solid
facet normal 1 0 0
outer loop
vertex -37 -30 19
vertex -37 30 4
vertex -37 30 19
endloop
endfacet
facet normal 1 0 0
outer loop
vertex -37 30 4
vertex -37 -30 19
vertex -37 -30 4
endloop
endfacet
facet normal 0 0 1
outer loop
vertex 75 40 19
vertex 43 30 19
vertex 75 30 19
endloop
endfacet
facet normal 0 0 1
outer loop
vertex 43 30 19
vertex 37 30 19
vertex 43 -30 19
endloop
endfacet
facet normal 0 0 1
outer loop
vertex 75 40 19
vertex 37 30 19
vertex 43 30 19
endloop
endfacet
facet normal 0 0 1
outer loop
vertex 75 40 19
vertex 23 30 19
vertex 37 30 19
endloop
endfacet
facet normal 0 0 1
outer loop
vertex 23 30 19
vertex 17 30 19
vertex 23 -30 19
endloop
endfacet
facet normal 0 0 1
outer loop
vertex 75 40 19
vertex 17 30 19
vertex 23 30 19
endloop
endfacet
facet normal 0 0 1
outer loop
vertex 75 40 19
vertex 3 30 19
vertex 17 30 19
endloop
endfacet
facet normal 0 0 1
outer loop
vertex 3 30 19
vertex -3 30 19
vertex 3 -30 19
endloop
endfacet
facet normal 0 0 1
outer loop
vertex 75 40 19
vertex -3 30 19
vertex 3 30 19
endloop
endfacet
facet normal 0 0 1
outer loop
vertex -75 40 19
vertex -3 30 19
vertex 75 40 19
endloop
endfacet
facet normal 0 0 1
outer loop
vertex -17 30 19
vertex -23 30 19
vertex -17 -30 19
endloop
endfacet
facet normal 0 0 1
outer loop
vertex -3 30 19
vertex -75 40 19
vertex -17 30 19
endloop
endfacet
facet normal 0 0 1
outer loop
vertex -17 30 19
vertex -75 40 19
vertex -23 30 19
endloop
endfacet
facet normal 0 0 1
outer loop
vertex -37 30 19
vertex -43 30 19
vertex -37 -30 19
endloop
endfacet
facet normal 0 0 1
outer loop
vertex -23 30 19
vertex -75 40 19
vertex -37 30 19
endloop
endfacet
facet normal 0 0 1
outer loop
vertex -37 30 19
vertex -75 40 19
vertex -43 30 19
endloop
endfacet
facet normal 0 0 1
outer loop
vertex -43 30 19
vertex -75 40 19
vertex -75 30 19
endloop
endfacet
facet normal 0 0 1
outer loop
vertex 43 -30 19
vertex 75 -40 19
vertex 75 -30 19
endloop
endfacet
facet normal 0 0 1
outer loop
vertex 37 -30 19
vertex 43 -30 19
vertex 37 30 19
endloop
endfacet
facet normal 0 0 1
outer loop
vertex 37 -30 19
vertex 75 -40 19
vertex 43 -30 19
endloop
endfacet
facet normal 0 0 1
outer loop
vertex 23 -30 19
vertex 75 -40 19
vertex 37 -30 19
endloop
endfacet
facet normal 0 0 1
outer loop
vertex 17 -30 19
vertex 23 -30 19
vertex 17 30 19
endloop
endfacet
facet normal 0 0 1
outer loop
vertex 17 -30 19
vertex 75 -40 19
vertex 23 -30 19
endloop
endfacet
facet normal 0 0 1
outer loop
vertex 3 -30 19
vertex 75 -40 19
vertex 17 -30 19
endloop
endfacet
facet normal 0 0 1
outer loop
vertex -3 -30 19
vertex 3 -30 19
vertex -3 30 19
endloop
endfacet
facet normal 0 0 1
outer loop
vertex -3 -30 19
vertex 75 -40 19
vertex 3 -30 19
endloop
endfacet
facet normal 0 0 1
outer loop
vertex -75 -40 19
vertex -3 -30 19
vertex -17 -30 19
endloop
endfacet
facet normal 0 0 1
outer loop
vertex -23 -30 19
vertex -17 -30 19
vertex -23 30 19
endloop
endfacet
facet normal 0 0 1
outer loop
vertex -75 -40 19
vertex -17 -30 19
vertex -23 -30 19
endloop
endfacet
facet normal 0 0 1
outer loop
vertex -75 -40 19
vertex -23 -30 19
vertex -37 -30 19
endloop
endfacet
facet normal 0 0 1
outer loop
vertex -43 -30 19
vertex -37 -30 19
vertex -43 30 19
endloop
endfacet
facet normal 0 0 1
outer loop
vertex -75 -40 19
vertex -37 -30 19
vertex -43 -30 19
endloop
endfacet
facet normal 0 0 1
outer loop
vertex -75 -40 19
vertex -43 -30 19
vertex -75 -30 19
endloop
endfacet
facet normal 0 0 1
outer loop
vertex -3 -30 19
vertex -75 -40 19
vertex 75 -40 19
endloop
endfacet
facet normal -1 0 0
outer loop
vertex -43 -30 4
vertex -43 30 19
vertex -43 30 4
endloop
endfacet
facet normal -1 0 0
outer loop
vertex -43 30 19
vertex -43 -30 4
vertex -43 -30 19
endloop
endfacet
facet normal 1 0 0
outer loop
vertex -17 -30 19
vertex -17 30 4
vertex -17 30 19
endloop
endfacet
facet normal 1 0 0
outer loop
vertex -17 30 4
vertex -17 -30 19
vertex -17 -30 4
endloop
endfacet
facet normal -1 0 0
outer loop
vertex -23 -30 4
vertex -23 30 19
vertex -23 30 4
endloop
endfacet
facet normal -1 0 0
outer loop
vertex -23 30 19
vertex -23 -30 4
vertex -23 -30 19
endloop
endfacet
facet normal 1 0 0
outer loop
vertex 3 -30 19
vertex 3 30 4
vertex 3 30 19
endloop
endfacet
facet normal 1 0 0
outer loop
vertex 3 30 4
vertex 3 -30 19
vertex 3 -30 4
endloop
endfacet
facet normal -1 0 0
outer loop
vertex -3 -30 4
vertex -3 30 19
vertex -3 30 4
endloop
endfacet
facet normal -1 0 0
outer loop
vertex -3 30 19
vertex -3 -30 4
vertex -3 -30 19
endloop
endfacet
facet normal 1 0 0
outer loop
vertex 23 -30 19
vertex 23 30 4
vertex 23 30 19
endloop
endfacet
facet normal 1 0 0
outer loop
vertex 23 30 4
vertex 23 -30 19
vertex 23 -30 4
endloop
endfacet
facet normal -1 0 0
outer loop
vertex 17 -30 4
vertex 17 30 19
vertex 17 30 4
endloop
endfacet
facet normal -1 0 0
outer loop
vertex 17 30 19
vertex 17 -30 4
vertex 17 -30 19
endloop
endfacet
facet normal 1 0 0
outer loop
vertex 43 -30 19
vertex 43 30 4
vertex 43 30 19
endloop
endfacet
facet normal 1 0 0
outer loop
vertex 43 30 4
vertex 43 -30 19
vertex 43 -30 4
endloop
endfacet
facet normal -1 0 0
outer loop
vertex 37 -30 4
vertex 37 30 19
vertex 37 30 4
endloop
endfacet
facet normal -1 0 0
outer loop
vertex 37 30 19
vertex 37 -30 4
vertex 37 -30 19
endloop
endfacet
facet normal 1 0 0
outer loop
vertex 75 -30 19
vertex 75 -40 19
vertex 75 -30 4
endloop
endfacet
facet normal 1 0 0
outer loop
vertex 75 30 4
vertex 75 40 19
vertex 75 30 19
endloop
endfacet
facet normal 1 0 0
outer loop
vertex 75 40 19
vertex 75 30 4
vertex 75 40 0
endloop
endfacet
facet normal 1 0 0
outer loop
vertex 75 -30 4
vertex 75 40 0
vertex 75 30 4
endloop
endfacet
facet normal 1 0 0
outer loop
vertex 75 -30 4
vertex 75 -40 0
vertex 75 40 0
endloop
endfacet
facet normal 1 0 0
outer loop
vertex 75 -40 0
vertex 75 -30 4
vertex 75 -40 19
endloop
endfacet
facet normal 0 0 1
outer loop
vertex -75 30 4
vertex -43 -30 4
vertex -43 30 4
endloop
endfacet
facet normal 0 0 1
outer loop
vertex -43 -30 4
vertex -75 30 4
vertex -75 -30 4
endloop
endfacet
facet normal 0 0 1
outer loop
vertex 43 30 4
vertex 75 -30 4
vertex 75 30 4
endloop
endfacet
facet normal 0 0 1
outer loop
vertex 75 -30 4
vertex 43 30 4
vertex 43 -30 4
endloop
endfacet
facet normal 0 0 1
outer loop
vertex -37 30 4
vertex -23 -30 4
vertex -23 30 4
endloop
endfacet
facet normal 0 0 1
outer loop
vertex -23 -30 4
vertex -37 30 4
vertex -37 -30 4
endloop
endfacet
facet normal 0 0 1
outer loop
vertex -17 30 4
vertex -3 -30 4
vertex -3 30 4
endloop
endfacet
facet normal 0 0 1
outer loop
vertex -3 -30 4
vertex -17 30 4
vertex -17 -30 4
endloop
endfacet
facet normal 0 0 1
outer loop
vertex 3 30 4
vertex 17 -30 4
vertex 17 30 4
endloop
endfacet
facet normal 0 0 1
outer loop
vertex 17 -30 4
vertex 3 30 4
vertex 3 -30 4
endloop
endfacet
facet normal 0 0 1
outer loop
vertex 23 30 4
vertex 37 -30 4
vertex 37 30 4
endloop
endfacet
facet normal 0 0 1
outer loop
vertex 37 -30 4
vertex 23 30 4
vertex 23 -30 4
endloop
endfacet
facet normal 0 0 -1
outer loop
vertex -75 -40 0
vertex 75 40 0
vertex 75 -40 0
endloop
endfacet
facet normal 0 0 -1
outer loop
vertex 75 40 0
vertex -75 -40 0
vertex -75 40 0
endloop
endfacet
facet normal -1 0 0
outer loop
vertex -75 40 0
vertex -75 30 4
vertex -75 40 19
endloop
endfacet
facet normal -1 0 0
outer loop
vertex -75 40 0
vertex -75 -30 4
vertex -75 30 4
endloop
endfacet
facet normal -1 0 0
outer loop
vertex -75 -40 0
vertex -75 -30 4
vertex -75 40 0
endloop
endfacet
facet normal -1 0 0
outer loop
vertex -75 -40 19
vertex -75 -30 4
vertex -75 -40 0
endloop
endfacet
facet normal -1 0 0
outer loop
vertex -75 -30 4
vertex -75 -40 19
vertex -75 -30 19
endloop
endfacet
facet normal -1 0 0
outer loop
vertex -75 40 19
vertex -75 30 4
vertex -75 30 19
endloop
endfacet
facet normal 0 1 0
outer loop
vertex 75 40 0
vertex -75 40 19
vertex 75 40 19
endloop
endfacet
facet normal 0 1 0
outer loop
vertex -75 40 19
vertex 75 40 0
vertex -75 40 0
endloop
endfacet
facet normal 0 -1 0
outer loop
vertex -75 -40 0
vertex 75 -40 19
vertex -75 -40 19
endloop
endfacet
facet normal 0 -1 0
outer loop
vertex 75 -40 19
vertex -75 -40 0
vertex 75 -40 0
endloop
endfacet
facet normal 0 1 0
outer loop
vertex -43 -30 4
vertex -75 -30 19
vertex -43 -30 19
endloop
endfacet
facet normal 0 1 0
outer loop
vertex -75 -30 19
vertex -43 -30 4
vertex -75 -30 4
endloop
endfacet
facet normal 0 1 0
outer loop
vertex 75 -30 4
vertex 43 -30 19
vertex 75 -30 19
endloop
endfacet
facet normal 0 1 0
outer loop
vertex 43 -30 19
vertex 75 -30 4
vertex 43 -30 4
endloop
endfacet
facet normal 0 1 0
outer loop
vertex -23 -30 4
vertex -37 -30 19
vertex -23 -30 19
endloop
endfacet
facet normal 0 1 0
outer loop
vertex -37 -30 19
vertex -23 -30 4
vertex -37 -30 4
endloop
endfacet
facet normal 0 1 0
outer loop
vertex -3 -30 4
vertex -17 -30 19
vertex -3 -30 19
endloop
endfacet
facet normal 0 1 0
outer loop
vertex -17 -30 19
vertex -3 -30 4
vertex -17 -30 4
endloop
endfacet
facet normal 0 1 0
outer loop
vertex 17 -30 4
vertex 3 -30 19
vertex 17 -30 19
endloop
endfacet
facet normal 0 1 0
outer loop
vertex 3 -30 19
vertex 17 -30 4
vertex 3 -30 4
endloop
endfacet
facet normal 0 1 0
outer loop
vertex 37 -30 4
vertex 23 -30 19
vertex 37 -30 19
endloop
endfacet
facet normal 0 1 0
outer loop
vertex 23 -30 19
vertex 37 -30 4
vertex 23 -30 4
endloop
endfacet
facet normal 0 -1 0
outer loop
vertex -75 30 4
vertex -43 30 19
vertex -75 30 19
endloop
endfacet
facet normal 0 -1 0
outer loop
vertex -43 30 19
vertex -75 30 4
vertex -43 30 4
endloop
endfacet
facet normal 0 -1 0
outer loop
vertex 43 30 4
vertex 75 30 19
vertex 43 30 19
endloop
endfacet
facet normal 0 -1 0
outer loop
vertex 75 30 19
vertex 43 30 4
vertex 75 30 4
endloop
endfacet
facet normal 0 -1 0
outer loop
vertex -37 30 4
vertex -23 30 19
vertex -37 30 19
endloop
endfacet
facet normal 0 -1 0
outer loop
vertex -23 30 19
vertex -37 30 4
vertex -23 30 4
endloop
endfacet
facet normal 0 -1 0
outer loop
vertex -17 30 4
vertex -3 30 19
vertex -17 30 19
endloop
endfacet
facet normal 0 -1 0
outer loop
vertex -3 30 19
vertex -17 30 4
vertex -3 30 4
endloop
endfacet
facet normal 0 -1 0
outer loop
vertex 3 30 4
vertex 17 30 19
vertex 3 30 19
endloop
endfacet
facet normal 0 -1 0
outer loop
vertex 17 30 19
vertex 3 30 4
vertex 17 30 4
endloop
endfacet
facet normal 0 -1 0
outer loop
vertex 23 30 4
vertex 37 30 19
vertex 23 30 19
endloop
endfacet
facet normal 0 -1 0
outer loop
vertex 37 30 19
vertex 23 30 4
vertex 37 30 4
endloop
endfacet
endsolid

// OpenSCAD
$fn = 32;

// ----------------------------------------------------------------------
// Rib frame 150 x 80 x 19
// 5 ribs at 20 mm pitch
// ----------------------------------------------------------------------

// --- parameters (mm) ---
frame = [150, 80, 4];  // base plate size (x, y, z)
rail_w = 10;           // side rail width
ribs = 5;              // number of ribs
rib_t = 6;             // rib thickness
rib_h = 15;            // rib height above the base plate
pitch = 20;            // pitch between rib centres

// --- derived feature positions (mm) ---
span = (ribs - 1) * pitch;          // = 80   distance between the outer ribs
origin_x = -span / 2;               // = -40   X of the first rib
rib_len = frame[1] - 2 * rail_w + 2;  // = 62   rib length, 1 mm into each rail
feature_centers = [
  [origin_x + 0 * pitch, 0],
  [origin_x + 1 * pitch, 0],
  [origin_x + 2 * pitch, 0],
  [origin_x + 3 * pitch, 0],
  [origin_x + 4 * pitch, 0]
];   // rib centre line, drives the rib loop

// base plate, two side rails, then the ribs read straight off feature_centers
union() {
  translate([-frame[0] / 2, -frame[1] / 2, 0]) cube(frame);
  translate([-frame[0] / 2, -frame[1] / 2, 0]) cube([frame[0], rail_w, frame[2] + rib_h]);
  translate([-frame[0] / 2, frame[1] / 2 - rail_w, 0]) cube([frame[0], rail_w, frame[2] + rib_h]);
  for (centre = feature_centers)
    translate([centre[0] - rib_t / 2, centre[1] - rib_len / 2, frame[2] - 1])
      cube([rib_t, rib_len, rib_h + 1]);
}
